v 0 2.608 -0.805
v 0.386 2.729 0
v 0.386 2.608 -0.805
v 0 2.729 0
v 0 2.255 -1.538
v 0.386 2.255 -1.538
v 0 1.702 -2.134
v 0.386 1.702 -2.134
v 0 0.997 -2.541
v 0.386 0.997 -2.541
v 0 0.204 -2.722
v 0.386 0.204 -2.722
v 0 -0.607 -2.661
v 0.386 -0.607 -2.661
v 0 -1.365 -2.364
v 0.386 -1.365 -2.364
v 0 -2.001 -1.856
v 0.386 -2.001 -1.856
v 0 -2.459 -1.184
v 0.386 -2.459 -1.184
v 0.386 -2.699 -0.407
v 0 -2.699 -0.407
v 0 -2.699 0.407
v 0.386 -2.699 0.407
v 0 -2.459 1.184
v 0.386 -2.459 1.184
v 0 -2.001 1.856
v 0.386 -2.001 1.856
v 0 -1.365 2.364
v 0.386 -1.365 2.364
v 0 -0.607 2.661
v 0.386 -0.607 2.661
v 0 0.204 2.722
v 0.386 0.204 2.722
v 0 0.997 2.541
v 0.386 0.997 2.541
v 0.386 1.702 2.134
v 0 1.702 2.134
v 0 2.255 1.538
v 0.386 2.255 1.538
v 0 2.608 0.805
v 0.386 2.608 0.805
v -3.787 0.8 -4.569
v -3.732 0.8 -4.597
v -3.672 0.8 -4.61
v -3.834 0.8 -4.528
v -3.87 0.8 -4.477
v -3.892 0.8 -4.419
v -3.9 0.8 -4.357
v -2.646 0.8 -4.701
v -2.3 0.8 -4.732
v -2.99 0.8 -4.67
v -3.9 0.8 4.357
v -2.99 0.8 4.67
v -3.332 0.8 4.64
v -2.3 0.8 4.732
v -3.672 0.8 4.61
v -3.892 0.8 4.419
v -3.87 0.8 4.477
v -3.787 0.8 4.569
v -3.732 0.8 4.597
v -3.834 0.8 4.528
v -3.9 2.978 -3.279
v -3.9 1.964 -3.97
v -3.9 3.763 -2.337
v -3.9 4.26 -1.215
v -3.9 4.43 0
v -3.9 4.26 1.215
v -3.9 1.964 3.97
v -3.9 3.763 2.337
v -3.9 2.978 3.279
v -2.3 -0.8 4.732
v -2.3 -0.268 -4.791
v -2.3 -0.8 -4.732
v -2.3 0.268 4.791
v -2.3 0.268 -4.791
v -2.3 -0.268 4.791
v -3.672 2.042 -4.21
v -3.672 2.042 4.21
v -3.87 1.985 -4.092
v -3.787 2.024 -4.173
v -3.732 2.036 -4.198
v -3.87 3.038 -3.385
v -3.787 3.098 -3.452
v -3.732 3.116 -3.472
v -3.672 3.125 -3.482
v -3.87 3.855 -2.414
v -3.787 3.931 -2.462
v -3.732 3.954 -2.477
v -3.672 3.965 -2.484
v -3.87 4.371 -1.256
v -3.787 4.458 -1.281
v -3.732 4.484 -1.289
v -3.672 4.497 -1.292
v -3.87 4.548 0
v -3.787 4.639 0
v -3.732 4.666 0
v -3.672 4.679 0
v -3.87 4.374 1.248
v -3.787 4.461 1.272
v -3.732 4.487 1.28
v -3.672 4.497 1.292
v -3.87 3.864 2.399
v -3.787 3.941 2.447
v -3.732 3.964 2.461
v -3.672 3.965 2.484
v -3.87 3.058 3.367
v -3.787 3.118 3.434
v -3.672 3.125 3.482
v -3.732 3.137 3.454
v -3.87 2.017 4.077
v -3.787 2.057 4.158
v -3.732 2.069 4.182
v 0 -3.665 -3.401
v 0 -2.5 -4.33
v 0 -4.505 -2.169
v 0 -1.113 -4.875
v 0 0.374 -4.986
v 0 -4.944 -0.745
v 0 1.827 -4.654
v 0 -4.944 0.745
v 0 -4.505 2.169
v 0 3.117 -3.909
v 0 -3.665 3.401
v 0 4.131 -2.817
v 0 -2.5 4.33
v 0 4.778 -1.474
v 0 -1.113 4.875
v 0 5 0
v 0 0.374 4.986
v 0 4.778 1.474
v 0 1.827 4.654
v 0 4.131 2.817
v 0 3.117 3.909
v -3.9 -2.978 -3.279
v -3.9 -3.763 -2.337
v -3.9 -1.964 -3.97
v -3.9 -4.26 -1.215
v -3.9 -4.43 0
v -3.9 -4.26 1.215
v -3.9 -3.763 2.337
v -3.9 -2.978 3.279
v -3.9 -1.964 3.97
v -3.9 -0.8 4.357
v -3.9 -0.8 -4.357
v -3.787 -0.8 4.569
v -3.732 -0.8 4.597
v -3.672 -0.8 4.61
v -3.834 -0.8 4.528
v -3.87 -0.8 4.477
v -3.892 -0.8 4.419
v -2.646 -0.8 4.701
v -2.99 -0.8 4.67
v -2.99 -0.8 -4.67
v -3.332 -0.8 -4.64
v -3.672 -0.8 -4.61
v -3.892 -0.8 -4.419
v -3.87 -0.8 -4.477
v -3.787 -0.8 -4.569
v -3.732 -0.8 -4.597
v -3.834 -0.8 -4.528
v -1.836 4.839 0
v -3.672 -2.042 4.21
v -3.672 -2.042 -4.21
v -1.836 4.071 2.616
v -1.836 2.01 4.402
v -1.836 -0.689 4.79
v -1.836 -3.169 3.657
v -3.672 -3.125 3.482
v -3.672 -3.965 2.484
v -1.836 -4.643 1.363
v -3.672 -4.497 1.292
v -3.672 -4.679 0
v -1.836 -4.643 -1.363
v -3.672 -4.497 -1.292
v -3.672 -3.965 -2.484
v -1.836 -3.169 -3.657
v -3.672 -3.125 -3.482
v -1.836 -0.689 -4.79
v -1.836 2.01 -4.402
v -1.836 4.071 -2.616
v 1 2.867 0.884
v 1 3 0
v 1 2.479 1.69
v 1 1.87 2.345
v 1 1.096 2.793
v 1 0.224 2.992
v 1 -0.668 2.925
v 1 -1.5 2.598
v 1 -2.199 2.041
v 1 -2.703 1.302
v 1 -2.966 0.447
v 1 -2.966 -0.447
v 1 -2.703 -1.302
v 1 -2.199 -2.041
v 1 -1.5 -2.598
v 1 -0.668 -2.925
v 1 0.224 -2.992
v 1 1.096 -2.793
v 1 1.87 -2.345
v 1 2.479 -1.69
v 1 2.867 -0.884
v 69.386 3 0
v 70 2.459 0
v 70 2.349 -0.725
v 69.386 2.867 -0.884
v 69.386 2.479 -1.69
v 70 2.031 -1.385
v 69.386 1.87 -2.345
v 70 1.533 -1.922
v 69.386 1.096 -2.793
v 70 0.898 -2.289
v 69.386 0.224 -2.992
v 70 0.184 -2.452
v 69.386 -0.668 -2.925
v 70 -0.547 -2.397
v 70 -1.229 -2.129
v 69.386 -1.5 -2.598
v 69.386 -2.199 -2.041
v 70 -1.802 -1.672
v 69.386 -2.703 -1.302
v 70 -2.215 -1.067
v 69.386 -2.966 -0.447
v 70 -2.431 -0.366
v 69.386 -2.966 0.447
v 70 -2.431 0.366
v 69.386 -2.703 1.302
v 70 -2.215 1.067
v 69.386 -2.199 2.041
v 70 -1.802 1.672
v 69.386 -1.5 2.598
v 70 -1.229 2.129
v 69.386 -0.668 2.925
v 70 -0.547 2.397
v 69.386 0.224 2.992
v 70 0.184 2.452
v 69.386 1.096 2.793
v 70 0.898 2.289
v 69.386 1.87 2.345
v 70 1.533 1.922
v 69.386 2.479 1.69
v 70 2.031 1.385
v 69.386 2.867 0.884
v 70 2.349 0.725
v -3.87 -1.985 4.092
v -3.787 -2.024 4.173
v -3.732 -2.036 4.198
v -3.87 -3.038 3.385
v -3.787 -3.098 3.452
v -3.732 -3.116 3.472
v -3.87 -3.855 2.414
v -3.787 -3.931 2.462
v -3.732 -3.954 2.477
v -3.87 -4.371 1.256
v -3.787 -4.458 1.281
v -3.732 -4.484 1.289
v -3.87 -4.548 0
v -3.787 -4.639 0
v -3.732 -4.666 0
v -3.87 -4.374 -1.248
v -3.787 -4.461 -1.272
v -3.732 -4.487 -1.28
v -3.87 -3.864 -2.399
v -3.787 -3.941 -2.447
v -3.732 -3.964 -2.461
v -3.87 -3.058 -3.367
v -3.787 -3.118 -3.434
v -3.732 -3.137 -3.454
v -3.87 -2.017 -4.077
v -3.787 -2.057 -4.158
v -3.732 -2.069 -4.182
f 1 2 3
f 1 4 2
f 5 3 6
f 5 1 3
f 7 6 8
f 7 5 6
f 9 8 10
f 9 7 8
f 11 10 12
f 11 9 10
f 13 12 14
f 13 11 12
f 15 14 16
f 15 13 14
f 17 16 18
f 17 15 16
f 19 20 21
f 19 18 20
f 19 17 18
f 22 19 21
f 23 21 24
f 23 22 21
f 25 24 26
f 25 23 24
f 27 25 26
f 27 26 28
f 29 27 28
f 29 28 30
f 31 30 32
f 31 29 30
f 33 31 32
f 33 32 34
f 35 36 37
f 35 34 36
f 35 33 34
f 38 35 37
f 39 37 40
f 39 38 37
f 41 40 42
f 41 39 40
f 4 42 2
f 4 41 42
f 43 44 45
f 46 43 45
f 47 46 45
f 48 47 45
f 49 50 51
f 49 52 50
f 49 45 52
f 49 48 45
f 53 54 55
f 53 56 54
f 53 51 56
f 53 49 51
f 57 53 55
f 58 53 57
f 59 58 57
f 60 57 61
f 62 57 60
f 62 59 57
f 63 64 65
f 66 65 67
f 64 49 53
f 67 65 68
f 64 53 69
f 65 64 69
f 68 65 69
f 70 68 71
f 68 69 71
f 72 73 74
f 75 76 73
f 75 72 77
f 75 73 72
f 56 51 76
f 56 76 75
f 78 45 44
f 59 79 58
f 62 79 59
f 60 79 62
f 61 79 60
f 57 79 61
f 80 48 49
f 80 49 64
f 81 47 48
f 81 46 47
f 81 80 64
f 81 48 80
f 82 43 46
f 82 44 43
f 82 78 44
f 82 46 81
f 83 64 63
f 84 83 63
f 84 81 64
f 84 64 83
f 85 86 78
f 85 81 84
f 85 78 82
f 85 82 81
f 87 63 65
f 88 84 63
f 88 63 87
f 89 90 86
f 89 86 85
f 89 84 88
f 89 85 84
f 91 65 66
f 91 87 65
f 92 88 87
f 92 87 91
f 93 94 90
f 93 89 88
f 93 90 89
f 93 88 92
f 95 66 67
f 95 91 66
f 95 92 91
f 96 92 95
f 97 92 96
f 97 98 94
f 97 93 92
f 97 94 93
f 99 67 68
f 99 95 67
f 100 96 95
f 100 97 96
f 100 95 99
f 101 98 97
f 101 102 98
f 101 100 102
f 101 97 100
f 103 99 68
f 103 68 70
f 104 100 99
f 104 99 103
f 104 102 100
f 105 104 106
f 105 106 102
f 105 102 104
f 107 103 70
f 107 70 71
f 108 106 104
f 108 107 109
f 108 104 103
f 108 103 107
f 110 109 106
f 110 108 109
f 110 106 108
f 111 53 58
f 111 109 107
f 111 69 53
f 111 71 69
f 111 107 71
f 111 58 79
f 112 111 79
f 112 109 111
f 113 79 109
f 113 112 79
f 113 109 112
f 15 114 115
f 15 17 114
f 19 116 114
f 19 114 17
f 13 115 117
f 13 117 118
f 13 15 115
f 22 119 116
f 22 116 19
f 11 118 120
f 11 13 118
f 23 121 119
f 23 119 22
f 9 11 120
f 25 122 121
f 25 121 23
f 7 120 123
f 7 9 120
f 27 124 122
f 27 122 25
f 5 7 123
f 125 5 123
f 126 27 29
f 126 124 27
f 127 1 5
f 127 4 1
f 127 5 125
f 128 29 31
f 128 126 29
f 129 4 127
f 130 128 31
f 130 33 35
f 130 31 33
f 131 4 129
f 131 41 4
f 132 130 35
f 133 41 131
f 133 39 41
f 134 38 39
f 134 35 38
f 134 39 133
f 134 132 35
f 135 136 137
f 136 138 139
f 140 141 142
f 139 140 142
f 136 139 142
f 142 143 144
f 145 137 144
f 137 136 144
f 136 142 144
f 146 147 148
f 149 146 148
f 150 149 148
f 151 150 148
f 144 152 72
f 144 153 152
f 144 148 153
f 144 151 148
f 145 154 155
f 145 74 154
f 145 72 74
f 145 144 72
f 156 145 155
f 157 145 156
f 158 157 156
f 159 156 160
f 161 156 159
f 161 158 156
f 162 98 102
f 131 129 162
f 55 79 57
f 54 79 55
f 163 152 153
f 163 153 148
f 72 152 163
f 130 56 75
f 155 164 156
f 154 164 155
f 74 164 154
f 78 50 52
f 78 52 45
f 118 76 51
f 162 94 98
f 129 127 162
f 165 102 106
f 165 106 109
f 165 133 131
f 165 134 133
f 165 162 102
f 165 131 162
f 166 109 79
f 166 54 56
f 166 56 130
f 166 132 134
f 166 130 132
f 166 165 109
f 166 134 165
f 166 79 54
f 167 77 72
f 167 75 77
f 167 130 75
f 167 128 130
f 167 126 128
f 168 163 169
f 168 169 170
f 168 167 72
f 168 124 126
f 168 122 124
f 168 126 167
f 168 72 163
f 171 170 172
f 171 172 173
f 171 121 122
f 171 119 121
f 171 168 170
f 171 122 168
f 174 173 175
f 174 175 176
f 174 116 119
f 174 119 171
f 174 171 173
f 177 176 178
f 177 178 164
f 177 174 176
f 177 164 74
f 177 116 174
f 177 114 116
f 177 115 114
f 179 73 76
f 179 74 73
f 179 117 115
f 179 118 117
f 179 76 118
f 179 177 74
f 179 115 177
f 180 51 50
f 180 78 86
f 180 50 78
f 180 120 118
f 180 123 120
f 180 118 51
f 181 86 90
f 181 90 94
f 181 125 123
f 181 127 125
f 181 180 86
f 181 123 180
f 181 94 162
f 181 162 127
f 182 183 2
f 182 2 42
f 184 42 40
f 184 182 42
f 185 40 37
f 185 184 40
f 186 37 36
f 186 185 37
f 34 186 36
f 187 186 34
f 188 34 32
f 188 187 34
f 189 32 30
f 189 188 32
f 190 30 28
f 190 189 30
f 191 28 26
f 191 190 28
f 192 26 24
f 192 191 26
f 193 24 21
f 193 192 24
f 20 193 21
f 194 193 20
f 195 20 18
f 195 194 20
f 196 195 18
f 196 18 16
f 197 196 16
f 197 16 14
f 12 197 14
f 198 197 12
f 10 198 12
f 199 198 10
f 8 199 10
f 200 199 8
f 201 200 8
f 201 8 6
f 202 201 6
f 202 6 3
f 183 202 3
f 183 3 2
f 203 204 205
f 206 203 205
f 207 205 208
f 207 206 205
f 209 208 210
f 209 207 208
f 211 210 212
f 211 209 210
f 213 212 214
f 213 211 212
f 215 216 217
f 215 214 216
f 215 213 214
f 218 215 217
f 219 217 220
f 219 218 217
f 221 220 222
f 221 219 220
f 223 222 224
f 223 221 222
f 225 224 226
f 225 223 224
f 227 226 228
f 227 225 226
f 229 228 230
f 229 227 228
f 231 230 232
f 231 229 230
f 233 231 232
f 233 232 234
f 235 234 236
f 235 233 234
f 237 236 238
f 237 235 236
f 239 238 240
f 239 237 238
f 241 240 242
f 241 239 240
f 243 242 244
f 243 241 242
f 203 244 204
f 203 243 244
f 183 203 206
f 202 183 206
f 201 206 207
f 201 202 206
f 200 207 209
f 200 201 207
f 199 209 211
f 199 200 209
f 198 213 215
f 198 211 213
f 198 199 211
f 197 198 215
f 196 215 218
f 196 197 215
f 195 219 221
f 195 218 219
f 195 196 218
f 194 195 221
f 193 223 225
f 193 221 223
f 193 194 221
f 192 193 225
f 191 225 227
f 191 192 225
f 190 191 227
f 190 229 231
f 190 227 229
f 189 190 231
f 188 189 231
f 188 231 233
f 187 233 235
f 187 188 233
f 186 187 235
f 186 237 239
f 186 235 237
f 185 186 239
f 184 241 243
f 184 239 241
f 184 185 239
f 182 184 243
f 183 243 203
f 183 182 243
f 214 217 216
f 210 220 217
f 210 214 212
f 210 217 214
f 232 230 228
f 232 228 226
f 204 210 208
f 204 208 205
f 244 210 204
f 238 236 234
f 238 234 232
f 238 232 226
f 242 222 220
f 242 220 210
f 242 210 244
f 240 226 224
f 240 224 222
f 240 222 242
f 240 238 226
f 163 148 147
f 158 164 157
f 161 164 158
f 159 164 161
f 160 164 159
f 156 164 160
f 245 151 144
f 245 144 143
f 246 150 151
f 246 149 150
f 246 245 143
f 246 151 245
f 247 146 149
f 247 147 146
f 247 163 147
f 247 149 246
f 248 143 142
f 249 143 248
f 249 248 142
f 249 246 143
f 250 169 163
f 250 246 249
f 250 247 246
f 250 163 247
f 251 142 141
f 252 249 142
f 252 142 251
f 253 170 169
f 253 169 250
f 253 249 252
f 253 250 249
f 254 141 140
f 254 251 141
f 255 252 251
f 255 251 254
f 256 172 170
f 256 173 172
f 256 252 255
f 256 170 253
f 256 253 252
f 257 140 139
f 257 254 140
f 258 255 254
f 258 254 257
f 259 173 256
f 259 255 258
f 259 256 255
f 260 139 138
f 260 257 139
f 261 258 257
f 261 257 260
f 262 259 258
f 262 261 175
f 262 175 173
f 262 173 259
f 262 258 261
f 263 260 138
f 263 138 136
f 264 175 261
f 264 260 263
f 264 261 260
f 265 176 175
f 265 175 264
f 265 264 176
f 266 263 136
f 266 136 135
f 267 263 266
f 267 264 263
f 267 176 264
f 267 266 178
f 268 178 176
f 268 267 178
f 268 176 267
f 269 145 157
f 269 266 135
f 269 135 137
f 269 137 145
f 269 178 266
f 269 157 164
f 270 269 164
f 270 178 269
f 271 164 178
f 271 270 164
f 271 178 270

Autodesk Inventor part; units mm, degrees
ref_plane "YZ Plane" through (0, 0, 0) normal (1, 0, 0) x (0, 1, 0)
ref_plane "XZ Plane" through (0, 0, 0) normal (0, 1, 0) x (-1, 0, 0)
sketch "Skizze1" plane through (0, 0, 0) normal (0, 0, 1) x (1, 0, 0)
  line L0 (-3.9, 0) -> (70, 0)
  line L1 (70, 0) -> (70, 3)
  line L2 (70, 3) -> (1, 3)
  line L3 (1, 3) -> (0.3864, 2.7294)
  line L4 (0.3864, 2.7294) -> (0, 2.7294)
  line L5 (0, 2.7294) -> (0, 5)
  line L6 (-18.68, 0) -> (84.78, 0) projected
  line L7 (0, -1) -> (0, 6) projected
  line L8 (-3.9, 0) -> (-3.9, 4.6588)
  line L9 (0, 5) -> (-3.9, 4.6588)
  line L10 (1, 3) -> (0, 3) construction
  dimension "d0" = 70
  dimension "d1" = 69
  dimension "d2" = 0.6136
  dimension "d3" = 3.9
  dimension "d4" = 6
  dimension "d5" = 5.4587
  dimension "d9" = 10
  dimension "d10" = 5
revolve "Körper" add sketch "Skizze1" angle 360 about axis through (-3.9, 0, 0) along (1, 0, 0)
sketch "Skizze2" plane through (-3.9, 0, 0) normal (-1, 0, 0) x (0, 0, 1)
  circle A0 centre (0, 0) radius 5 projected
  line L0 (0, 0) -> (0, 4.6588) projected
  line L1 (-5, 0.8) -> (5, 0.8)
  line L2 (5, 0.8) -> (5, -0.8)
  line L3 (5, -0.8) -> (-5, -0.8)
  line L4 (-5, -0.8) -> (-5, 0.8)
  line L5 (-5, 0) -> (5, 0) construction
  line L6 (0, 0.8) -> (0, -0.8) construction
  dimension "d11" = 1.6
  dimension "d12" = 10
fillet "Rundung1" radius 0.25 1 edges at (-3.9, -4.6588, 0)
extrude "Loch" cut sketch "Skizze2" against normal blind 1.6 contours A0 L3 L1 | L2 L3 A0 | A0 L1 L2 | A0 L4 L1 | L3 L4 A0
thread "Gewinde" size "M6x1" class "6g" standard "ISO Metric profile" full length
chamfer "Fase1" distance 0.5413 distance2 0.6136 1 edges at (70, -3, 0) measured on face at (70, 1.3648, -1.3588)
ref_plane "Work Plane1" through (30.1625, 0, 0) normal (0, 0, -1) x (1, 0, 0)
equation "\"d11\" = SBR"
equation "\"d12\" = KOD"
equation "\"d14\" = RR"
equation "\"d19\" = STI"
equation "\"d15\" = GEL"
equation "\"d17\" = -0.5 * SPD + 0.5 * GD"
equation "\"d3\" = KOH"
equation "\"d4\" = GD"
equation "\"d5\" = BDM"
equation "\"d9\" = KOD"
equation "\"d10\" = KEWI"
equation "\"GD\" = 6"
equation "\"GEL\" = 38"
equation "\"KOD\" = 10"
equation "\"KOH\" = 3.9"
equation "\"GAL\" = 0.61345 * PTC"
equation "\"SPD\" = 4.91747"
equation "\"BDM\" = 5.45873"
equation "\"GUL\" = 0.61345 * PTC"
equation "\"RR\" = 0.25"
equation "\"SBR\" = 1.6"
equation "\"STI\" = 1.6"
equation "\"KEWI\" = 5deg"
equation "\"PTC\" = 1"
equation "\"THREADDIA\" = 6"
equation "\"TOA\" = 30deg"
equation "\"NND\" = 6"
equation "\"GD1\" = THREADDIA - 1.2269 * PTC"
properties part number "DIN 84 - M6 x 70" material "Stahl, weich"
